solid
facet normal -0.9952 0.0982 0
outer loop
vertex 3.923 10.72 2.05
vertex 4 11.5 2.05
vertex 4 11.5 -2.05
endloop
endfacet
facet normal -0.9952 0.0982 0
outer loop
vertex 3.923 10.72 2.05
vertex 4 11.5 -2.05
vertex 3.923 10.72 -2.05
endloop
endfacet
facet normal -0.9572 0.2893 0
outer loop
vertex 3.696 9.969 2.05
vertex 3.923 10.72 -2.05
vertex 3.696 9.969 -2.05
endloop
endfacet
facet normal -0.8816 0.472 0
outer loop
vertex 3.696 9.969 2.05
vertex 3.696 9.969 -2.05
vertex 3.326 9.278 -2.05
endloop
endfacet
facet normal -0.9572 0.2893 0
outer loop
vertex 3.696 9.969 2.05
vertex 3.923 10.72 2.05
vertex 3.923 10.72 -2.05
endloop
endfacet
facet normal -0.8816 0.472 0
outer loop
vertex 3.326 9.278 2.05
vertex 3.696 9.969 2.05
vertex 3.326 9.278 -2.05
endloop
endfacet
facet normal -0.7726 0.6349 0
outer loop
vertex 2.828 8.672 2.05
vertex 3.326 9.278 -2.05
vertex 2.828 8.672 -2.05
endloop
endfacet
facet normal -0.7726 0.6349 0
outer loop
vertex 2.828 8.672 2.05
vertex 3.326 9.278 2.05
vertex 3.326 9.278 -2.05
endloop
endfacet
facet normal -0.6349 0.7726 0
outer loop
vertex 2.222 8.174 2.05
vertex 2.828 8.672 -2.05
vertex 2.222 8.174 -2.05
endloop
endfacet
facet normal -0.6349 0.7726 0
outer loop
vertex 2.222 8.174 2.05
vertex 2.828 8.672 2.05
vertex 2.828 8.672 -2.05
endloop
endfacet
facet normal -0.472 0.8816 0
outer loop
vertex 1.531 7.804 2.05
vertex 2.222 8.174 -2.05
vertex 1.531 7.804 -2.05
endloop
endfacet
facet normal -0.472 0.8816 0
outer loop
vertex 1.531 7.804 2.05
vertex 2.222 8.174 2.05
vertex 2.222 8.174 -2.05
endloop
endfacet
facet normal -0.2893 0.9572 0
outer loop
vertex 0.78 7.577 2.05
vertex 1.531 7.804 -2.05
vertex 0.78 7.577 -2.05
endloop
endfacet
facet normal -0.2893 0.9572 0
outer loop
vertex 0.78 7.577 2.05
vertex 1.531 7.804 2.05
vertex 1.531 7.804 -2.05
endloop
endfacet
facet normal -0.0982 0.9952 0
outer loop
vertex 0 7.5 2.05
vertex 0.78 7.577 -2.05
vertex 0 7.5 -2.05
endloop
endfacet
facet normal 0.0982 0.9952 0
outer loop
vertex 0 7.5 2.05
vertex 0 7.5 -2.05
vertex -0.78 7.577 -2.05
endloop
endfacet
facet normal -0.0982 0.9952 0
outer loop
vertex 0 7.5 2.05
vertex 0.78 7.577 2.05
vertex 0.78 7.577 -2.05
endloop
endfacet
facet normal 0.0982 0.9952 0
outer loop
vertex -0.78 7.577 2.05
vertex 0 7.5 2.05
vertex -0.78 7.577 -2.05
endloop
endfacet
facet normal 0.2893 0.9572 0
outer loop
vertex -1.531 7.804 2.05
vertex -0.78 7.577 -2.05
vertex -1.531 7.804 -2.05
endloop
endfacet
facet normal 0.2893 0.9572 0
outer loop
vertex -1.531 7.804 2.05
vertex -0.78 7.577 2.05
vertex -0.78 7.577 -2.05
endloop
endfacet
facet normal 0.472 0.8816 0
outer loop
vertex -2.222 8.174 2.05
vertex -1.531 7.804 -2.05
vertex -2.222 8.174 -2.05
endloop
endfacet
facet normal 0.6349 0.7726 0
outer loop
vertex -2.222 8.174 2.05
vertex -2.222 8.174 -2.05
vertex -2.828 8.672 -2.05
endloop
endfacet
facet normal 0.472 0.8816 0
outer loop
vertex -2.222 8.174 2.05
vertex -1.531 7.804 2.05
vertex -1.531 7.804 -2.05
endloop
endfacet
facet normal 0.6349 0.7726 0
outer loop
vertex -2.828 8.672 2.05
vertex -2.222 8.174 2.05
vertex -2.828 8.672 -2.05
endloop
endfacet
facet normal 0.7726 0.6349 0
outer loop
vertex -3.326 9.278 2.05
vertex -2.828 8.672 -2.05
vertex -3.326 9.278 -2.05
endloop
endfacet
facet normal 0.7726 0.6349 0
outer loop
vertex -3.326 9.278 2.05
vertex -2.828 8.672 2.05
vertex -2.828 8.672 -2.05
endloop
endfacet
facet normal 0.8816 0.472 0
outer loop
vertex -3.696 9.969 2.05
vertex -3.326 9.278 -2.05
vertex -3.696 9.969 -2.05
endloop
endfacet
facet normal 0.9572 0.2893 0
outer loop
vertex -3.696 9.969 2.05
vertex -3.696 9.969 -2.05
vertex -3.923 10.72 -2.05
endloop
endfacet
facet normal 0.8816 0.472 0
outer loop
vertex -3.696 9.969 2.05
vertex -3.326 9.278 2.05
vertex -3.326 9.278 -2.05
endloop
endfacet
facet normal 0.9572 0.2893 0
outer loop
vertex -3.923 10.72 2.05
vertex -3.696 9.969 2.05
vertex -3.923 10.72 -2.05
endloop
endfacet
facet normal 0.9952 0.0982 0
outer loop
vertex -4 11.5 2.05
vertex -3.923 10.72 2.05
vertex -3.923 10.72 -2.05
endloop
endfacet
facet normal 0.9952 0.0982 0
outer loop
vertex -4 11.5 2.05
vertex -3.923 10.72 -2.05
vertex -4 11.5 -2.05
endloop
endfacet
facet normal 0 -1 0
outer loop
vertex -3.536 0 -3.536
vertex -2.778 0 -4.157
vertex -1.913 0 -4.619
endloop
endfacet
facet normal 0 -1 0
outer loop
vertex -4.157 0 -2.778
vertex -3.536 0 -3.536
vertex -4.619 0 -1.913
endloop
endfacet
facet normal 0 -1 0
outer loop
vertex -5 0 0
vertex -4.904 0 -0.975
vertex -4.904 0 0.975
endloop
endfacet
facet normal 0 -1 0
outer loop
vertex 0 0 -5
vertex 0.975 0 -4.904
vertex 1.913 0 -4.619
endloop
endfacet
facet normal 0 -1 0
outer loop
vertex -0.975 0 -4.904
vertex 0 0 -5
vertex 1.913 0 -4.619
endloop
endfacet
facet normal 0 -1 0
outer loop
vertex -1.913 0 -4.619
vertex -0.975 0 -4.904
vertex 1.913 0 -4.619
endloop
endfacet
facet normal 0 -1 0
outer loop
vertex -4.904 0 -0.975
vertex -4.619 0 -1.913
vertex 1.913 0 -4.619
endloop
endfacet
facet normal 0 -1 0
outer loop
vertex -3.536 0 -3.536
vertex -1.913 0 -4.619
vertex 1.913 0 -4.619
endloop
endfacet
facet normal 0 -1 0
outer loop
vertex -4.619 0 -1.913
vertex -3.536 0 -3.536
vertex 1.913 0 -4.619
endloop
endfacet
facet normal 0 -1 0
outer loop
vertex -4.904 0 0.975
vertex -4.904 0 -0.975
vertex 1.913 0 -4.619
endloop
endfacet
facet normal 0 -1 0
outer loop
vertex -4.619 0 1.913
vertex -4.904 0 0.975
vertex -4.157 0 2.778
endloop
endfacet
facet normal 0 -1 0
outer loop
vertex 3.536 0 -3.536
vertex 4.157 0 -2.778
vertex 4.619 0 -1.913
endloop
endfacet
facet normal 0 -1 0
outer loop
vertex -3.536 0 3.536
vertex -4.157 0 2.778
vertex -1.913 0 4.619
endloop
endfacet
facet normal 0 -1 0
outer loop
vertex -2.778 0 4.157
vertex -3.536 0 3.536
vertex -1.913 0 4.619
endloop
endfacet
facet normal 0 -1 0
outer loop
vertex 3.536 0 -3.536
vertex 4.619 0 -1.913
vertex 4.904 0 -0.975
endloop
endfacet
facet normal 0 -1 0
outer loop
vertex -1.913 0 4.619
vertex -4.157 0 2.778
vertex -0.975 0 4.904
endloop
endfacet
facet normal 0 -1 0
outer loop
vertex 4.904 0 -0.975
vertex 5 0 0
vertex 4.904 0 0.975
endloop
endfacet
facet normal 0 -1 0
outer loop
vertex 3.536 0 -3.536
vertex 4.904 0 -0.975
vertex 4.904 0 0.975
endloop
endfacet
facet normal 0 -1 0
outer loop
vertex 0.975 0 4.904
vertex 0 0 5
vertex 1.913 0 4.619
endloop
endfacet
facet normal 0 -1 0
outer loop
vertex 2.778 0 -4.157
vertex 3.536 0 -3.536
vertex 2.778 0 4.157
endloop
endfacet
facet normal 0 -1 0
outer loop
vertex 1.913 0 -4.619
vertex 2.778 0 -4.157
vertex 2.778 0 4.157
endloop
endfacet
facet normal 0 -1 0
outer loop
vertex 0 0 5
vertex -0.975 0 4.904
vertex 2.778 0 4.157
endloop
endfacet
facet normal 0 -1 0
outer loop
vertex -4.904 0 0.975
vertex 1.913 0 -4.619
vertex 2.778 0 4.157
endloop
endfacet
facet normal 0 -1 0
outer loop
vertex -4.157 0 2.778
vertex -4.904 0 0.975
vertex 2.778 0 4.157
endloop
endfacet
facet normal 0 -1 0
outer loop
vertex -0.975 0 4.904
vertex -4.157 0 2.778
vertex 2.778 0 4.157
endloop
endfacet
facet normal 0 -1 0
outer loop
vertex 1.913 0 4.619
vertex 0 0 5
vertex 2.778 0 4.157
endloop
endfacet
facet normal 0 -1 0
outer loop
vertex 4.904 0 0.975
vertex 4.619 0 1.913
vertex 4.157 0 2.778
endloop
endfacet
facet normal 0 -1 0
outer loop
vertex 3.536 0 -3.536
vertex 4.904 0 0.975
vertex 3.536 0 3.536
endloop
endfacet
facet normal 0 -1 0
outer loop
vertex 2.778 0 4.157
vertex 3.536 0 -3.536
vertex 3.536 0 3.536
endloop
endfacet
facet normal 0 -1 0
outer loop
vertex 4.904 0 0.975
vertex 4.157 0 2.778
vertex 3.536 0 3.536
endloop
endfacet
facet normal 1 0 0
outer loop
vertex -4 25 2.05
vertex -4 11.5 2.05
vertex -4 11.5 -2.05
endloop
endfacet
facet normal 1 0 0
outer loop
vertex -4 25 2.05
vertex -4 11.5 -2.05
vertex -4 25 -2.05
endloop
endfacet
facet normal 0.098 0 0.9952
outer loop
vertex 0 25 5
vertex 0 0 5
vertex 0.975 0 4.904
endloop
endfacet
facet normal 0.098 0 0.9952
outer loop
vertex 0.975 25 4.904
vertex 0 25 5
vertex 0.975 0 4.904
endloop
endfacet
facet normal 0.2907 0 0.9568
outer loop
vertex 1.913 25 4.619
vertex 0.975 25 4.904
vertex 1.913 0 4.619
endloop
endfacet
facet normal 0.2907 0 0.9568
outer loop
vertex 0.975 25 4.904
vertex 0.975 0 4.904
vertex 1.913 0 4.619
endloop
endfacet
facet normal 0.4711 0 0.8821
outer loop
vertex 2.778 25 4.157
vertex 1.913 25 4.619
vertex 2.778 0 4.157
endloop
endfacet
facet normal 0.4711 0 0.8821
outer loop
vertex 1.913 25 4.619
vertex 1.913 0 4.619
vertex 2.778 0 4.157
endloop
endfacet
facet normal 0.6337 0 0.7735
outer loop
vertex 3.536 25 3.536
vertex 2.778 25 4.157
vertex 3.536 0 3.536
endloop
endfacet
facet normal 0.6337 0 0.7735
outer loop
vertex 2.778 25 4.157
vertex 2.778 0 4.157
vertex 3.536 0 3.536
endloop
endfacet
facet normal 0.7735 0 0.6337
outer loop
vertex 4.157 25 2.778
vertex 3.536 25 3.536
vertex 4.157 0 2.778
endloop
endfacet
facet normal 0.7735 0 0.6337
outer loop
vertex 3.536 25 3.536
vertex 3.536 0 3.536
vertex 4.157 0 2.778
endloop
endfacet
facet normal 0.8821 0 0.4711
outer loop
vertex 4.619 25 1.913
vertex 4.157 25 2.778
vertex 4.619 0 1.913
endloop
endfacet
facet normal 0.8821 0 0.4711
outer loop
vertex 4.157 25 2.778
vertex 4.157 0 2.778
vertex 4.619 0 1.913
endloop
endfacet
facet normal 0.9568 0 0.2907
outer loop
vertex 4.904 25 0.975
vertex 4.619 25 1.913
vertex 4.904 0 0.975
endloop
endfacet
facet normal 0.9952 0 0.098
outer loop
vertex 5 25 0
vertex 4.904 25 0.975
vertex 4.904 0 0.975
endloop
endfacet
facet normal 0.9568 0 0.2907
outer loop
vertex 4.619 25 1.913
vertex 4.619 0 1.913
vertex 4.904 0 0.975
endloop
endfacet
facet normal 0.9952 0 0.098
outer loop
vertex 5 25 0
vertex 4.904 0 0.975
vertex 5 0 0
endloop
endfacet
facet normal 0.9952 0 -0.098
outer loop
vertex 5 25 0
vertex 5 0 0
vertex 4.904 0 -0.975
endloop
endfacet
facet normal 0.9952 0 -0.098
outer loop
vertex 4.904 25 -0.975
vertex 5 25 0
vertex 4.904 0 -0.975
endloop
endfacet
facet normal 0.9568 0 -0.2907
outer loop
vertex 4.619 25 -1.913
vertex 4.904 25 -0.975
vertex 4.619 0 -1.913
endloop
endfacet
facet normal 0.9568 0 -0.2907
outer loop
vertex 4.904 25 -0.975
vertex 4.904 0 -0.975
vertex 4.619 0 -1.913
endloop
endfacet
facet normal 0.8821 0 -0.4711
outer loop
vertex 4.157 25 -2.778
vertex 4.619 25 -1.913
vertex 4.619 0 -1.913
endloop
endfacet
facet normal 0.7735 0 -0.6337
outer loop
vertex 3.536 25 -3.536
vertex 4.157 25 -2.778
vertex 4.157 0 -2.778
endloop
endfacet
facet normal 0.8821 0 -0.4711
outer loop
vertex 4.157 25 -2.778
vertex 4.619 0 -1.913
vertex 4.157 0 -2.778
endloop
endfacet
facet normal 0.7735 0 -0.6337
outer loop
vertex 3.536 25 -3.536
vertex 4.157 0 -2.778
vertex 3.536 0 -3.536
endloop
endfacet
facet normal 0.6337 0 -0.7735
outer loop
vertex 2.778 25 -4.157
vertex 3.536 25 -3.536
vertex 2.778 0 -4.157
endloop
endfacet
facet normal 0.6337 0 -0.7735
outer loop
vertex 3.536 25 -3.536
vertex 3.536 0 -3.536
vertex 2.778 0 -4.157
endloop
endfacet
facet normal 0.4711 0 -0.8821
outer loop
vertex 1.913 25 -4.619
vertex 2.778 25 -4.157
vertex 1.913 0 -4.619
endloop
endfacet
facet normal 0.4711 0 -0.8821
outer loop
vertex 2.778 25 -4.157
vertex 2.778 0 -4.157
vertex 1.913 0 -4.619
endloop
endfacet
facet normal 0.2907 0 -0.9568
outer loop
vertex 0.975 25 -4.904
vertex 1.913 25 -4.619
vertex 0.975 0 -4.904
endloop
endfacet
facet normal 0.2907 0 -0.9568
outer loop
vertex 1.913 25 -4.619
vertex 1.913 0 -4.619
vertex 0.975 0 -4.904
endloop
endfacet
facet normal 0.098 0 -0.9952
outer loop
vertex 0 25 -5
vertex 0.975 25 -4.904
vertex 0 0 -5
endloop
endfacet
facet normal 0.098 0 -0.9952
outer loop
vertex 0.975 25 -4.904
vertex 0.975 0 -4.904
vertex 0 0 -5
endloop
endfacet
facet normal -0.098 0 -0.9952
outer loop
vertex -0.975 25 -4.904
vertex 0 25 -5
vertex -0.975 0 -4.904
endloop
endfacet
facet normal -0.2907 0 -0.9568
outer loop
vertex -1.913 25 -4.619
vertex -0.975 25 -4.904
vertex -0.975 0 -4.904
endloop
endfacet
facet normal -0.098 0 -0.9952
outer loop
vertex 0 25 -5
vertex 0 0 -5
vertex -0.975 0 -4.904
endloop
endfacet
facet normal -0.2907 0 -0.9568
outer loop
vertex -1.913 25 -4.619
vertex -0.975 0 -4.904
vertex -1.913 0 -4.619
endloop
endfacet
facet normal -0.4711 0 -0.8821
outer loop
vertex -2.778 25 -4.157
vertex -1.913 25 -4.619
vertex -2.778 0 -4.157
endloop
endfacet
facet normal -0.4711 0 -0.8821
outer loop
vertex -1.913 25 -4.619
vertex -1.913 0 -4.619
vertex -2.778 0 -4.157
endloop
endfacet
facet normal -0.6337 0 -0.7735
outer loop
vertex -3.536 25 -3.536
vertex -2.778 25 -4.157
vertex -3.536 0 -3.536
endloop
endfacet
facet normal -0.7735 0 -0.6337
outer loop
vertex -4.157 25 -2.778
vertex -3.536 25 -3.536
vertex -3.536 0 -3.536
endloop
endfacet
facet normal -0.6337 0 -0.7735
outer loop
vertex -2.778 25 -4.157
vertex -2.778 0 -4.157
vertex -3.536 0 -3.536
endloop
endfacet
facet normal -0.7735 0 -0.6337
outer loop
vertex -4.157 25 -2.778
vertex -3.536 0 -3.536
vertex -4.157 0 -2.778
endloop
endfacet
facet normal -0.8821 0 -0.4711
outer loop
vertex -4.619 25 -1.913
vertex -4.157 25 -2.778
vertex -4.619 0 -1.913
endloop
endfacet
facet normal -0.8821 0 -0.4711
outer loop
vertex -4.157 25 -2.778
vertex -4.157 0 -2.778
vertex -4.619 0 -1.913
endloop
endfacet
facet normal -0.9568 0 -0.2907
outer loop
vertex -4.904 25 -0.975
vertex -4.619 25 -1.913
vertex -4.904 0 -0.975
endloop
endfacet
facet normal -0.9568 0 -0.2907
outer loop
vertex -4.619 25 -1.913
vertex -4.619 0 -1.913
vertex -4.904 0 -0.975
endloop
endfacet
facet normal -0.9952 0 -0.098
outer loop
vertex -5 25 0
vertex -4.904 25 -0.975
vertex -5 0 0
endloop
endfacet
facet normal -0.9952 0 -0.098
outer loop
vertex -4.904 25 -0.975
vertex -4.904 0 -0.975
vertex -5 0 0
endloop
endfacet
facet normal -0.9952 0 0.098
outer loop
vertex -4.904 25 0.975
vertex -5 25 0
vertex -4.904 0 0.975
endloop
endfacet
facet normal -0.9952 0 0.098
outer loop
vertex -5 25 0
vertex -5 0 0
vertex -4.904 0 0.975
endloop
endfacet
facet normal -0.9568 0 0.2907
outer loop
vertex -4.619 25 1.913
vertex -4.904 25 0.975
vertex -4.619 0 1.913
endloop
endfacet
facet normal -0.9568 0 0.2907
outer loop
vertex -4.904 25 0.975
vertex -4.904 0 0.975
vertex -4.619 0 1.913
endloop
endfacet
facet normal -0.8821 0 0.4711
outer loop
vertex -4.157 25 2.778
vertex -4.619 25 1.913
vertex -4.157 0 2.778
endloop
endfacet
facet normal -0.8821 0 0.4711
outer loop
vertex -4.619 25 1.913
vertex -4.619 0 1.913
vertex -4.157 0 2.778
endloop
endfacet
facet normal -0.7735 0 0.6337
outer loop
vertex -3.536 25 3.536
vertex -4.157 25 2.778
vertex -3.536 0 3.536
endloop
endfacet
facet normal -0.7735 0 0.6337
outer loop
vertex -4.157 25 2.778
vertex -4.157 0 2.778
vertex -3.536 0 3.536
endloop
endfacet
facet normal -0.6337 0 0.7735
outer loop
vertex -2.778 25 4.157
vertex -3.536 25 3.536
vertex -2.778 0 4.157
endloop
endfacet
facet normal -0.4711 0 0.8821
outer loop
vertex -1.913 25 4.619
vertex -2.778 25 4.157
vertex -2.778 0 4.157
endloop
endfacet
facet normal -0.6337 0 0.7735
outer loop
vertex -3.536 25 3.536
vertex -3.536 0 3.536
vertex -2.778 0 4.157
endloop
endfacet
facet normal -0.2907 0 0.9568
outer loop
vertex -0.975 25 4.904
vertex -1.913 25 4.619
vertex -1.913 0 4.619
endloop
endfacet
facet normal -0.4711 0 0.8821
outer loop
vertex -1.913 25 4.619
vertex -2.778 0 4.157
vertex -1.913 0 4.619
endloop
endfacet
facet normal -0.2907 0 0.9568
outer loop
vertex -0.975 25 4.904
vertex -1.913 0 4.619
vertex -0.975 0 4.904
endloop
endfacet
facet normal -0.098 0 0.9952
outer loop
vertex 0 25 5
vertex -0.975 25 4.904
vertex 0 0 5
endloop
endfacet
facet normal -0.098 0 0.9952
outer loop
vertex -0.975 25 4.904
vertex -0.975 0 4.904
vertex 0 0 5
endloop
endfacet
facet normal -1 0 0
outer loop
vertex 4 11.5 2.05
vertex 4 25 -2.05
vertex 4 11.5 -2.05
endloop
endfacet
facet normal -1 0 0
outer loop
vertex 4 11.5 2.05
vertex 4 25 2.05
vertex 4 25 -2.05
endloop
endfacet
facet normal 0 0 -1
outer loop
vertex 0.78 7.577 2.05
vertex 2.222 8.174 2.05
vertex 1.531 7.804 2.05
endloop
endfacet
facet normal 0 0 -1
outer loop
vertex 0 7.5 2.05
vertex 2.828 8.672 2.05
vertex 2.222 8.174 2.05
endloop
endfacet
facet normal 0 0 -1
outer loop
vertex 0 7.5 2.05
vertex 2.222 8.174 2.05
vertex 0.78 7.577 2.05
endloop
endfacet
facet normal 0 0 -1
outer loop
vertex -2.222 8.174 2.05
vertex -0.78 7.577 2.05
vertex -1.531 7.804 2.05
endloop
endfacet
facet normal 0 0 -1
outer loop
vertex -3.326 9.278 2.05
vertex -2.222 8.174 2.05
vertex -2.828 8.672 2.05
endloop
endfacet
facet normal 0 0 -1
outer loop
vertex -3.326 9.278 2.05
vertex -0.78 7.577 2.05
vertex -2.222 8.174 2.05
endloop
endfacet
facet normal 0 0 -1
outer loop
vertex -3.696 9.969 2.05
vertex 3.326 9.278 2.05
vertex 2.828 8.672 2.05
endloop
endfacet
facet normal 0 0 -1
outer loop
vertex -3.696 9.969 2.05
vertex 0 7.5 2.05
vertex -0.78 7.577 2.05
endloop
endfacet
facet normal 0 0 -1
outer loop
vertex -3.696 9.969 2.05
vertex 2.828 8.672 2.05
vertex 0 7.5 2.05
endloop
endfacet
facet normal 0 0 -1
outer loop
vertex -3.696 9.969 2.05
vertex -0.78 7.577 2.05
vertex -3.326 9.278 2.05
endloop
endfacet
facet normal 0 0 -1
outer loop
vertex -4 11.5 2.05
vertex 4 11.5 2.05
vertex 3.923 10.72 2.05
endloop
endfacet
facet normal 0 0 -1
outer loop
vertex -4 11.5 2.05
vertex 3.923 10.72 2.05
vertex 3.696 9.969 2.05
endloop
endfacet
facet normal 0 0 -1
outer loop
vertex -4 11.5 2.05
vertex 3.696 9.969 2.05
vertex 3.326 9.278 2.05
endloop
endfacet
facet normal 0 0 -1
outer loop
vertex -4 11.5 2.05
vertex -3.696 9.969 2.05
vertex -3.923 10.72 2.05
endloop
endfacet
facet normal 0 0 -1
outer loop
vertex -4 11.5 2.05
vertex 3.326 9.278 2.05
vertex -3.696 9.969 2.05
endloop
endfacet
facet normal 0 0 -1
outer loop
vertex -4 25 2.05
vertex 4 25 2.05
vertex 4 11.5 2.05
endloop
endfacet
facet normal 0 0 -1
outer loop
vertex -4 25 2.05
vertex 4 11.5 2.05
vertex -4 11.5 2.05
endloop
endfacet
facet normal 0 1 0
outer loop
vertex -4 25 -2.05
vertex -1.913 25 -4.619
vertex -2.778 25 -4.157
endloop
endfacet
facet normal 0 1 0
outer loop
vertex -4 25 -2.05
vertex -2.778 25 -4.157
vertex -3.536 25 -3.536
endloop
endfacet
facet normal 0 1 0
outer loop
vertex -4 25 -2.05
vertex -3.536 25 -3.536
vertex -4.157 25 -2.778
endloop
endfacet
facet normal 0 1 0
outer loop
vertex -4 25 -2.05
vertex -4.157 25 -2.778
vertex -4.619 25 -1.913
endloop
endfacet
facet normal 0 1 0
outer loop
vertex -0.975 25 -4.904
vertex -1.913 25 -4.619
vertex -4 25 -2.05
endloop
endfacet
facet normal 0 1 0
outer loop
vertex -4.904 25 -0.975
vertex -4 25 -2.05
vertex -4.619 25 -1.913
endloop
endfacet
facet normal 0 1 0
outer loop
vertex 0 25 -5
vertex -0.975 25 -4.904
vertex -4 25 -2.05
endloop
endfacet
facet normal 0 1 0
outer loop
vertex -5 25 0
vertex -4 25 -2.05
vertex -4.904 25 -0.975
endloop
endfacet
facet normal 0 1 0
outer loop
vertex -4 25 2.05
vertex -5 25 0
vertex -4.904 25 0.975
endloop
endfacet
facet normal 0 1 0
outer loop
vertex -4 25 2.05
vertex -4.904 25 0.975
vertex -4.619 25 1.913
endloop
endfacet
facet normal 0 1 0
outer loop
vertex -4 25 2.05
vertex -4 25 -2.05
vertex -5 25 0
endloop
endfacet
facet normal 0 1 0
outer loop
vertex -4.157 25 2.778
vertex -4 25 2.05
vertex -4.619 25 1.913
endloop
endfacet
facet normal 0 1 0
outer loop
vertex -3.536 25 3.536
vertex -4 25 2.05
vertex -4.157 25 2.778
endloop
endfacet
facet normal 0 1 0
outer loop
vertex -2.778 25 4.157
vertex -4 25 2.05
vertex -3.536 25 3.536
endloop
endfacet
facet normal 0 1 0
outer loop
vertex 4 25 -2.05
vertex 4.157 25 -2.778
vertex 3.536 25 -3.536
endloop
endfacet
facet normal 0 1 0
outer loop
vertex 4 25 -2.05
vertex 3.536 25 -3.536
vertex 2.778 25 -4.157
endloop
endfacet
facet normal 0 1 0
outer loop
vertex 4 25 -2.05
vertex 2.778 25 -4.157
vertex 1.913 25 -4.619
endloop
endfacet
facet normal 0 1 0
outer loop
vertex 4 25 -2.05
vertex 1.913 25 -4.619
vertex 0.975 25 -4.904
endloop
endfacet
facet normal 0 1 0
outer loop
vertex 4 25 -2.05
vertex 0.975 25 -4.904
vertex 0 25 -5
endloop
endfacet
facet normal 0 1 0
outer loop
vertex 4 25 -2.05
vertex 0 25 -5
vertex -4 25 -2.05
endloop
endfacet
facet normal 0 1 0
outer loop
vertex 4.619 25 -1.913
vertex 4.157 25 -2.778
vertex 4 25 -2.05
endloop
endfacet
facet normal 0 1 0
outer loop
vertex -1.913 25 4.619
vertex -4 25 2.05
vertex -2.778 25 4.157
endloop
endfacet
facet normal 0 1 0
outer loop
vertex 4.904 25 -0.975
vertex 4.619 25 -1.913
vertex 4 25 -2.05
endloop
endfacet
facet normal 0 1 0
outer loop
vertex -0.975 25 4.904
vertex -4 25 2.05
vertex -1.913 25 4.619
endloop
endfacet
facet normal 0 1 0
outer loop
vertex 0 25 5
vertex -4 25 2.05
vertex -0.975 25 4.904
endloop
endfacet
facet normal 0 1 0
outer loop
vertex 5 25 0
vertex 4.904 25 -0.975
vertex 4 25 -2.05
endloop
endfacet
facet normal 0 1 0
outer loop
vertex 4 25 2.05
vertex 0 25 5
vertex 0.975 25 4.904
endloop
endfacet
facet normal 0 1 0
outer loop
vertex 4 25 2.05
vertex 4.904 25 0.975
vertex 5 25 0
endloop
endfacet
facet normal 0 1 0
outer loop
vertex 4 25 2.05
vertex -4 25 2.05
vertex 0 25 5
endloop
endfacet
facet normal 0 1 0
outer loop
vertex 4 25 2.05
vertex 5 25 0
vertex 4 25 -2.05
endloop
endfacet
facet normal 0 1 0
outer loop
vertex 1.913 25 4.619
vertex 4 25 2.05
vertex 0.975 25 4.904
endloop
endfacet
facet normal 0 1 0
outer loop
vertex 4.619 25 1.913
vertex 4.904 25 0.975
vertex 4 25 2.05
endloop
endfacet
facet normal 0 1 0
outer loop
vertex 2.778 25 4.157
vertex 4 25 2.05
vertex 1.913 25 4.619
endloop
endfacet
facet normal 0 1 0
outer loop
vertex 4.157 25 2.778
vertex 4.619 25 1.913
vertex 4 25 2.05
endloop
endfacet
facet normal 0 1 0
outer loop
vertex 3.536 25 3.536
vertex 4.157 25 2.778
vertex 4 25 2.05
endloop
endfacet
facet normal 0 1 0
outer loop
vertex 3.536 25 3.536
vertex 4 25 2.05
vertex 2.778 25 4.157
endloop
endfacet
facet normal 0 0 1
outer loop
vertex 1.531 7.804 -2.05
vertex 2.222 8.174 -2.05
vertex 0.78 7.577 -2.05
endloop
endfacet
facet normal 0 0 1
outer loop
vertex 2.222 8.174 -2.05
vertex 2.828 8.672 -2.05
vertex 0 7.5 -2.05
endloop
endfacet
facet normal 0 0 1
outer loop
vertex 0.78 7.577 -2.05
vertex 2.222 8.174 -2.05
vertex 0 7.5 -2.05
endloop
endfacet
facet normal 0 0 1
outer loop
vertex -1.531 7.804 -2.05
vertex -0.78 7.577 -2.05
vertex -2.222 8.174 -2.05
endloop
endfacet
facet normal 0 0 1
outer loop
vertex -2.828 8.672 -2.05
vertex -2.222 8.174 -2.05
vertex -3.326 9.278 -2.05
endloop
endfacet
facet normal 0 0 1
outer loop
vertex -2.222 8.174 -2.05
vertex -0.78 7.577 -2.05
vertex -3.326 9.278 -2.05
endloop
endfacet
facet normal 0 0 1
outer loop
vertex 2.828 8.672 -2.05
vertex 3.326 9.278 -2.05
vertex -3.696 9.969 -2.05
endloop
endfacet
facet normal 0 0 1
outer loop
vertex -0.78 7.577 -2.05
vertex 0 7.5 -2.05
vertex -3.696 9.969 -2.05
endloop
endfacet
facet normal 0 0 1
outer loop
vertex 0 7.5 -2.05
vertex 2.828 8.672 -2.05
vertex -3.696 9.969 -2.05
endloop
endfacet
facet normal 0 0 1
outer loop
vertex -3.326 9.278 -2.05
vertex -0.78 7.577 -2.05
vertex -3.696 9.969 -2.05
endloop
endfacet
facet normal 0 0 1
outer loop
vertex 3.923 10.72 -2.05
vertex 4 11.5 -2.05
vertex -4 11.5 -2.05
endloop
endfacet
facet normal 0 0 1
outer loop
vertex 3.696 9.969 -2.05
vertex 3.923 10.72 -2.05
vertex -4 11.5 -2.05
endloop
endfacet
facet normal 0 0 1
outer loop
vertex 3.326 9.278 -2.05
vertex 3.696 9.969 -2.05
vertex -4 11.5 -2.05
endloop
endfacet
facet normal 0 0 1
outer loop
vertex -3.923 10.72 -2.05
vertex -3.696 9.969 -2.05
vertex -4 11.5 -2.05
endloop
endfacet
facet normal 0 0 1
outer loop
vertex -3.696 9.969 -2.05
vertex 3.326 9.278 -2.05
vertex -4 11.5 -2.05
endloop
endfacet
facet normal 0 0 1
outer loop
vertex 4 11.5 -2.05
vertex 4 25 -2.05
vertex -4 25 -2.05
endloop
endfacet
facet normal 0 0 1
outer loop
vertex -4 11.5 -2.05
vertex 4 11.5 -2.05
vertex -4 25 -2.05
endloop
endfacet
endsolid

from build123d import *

# Parameters (mm, degrees)
SKETCH1_R           = 5
BOSS_EXTRUDE1_DEPTH = 25
CUT_EXTRUDE1_DEPTH  = 2.05


with BuildPart() as part:
    # Sketch1 → Boss-Extrude1 (new body)
    with BuildSketch(Plane(origin=(0, 0, 0), x_dir=(1, 0, 0), z_dir=(0, 1, 0))):
        with Locations(Location((0, 0, 0), (0, 0, 270))):
            Circle(SKETCH1_R)
    extrude(amount=BOSS_EXTRUDE1_DEPTH)

    # Sketch2 → Cut-Extrude1 (cut, symmetric)
    with BuildSketch(Plane.XY):
        with BuildLine():
            Line((-4, 11.5), (-4, 25))
            Line((-4, 25), (4, 25))
            Line((4, 25), (4, 11.5))
            ThreePointArc((4, 11.5), (0, 7.5), (-4, 11.5))
        make_face()
    extrude(amount=CUT_EXTRUDE1_DEPTH, both=True, mode=Mode.SUBTRACT)


solid = part.part
